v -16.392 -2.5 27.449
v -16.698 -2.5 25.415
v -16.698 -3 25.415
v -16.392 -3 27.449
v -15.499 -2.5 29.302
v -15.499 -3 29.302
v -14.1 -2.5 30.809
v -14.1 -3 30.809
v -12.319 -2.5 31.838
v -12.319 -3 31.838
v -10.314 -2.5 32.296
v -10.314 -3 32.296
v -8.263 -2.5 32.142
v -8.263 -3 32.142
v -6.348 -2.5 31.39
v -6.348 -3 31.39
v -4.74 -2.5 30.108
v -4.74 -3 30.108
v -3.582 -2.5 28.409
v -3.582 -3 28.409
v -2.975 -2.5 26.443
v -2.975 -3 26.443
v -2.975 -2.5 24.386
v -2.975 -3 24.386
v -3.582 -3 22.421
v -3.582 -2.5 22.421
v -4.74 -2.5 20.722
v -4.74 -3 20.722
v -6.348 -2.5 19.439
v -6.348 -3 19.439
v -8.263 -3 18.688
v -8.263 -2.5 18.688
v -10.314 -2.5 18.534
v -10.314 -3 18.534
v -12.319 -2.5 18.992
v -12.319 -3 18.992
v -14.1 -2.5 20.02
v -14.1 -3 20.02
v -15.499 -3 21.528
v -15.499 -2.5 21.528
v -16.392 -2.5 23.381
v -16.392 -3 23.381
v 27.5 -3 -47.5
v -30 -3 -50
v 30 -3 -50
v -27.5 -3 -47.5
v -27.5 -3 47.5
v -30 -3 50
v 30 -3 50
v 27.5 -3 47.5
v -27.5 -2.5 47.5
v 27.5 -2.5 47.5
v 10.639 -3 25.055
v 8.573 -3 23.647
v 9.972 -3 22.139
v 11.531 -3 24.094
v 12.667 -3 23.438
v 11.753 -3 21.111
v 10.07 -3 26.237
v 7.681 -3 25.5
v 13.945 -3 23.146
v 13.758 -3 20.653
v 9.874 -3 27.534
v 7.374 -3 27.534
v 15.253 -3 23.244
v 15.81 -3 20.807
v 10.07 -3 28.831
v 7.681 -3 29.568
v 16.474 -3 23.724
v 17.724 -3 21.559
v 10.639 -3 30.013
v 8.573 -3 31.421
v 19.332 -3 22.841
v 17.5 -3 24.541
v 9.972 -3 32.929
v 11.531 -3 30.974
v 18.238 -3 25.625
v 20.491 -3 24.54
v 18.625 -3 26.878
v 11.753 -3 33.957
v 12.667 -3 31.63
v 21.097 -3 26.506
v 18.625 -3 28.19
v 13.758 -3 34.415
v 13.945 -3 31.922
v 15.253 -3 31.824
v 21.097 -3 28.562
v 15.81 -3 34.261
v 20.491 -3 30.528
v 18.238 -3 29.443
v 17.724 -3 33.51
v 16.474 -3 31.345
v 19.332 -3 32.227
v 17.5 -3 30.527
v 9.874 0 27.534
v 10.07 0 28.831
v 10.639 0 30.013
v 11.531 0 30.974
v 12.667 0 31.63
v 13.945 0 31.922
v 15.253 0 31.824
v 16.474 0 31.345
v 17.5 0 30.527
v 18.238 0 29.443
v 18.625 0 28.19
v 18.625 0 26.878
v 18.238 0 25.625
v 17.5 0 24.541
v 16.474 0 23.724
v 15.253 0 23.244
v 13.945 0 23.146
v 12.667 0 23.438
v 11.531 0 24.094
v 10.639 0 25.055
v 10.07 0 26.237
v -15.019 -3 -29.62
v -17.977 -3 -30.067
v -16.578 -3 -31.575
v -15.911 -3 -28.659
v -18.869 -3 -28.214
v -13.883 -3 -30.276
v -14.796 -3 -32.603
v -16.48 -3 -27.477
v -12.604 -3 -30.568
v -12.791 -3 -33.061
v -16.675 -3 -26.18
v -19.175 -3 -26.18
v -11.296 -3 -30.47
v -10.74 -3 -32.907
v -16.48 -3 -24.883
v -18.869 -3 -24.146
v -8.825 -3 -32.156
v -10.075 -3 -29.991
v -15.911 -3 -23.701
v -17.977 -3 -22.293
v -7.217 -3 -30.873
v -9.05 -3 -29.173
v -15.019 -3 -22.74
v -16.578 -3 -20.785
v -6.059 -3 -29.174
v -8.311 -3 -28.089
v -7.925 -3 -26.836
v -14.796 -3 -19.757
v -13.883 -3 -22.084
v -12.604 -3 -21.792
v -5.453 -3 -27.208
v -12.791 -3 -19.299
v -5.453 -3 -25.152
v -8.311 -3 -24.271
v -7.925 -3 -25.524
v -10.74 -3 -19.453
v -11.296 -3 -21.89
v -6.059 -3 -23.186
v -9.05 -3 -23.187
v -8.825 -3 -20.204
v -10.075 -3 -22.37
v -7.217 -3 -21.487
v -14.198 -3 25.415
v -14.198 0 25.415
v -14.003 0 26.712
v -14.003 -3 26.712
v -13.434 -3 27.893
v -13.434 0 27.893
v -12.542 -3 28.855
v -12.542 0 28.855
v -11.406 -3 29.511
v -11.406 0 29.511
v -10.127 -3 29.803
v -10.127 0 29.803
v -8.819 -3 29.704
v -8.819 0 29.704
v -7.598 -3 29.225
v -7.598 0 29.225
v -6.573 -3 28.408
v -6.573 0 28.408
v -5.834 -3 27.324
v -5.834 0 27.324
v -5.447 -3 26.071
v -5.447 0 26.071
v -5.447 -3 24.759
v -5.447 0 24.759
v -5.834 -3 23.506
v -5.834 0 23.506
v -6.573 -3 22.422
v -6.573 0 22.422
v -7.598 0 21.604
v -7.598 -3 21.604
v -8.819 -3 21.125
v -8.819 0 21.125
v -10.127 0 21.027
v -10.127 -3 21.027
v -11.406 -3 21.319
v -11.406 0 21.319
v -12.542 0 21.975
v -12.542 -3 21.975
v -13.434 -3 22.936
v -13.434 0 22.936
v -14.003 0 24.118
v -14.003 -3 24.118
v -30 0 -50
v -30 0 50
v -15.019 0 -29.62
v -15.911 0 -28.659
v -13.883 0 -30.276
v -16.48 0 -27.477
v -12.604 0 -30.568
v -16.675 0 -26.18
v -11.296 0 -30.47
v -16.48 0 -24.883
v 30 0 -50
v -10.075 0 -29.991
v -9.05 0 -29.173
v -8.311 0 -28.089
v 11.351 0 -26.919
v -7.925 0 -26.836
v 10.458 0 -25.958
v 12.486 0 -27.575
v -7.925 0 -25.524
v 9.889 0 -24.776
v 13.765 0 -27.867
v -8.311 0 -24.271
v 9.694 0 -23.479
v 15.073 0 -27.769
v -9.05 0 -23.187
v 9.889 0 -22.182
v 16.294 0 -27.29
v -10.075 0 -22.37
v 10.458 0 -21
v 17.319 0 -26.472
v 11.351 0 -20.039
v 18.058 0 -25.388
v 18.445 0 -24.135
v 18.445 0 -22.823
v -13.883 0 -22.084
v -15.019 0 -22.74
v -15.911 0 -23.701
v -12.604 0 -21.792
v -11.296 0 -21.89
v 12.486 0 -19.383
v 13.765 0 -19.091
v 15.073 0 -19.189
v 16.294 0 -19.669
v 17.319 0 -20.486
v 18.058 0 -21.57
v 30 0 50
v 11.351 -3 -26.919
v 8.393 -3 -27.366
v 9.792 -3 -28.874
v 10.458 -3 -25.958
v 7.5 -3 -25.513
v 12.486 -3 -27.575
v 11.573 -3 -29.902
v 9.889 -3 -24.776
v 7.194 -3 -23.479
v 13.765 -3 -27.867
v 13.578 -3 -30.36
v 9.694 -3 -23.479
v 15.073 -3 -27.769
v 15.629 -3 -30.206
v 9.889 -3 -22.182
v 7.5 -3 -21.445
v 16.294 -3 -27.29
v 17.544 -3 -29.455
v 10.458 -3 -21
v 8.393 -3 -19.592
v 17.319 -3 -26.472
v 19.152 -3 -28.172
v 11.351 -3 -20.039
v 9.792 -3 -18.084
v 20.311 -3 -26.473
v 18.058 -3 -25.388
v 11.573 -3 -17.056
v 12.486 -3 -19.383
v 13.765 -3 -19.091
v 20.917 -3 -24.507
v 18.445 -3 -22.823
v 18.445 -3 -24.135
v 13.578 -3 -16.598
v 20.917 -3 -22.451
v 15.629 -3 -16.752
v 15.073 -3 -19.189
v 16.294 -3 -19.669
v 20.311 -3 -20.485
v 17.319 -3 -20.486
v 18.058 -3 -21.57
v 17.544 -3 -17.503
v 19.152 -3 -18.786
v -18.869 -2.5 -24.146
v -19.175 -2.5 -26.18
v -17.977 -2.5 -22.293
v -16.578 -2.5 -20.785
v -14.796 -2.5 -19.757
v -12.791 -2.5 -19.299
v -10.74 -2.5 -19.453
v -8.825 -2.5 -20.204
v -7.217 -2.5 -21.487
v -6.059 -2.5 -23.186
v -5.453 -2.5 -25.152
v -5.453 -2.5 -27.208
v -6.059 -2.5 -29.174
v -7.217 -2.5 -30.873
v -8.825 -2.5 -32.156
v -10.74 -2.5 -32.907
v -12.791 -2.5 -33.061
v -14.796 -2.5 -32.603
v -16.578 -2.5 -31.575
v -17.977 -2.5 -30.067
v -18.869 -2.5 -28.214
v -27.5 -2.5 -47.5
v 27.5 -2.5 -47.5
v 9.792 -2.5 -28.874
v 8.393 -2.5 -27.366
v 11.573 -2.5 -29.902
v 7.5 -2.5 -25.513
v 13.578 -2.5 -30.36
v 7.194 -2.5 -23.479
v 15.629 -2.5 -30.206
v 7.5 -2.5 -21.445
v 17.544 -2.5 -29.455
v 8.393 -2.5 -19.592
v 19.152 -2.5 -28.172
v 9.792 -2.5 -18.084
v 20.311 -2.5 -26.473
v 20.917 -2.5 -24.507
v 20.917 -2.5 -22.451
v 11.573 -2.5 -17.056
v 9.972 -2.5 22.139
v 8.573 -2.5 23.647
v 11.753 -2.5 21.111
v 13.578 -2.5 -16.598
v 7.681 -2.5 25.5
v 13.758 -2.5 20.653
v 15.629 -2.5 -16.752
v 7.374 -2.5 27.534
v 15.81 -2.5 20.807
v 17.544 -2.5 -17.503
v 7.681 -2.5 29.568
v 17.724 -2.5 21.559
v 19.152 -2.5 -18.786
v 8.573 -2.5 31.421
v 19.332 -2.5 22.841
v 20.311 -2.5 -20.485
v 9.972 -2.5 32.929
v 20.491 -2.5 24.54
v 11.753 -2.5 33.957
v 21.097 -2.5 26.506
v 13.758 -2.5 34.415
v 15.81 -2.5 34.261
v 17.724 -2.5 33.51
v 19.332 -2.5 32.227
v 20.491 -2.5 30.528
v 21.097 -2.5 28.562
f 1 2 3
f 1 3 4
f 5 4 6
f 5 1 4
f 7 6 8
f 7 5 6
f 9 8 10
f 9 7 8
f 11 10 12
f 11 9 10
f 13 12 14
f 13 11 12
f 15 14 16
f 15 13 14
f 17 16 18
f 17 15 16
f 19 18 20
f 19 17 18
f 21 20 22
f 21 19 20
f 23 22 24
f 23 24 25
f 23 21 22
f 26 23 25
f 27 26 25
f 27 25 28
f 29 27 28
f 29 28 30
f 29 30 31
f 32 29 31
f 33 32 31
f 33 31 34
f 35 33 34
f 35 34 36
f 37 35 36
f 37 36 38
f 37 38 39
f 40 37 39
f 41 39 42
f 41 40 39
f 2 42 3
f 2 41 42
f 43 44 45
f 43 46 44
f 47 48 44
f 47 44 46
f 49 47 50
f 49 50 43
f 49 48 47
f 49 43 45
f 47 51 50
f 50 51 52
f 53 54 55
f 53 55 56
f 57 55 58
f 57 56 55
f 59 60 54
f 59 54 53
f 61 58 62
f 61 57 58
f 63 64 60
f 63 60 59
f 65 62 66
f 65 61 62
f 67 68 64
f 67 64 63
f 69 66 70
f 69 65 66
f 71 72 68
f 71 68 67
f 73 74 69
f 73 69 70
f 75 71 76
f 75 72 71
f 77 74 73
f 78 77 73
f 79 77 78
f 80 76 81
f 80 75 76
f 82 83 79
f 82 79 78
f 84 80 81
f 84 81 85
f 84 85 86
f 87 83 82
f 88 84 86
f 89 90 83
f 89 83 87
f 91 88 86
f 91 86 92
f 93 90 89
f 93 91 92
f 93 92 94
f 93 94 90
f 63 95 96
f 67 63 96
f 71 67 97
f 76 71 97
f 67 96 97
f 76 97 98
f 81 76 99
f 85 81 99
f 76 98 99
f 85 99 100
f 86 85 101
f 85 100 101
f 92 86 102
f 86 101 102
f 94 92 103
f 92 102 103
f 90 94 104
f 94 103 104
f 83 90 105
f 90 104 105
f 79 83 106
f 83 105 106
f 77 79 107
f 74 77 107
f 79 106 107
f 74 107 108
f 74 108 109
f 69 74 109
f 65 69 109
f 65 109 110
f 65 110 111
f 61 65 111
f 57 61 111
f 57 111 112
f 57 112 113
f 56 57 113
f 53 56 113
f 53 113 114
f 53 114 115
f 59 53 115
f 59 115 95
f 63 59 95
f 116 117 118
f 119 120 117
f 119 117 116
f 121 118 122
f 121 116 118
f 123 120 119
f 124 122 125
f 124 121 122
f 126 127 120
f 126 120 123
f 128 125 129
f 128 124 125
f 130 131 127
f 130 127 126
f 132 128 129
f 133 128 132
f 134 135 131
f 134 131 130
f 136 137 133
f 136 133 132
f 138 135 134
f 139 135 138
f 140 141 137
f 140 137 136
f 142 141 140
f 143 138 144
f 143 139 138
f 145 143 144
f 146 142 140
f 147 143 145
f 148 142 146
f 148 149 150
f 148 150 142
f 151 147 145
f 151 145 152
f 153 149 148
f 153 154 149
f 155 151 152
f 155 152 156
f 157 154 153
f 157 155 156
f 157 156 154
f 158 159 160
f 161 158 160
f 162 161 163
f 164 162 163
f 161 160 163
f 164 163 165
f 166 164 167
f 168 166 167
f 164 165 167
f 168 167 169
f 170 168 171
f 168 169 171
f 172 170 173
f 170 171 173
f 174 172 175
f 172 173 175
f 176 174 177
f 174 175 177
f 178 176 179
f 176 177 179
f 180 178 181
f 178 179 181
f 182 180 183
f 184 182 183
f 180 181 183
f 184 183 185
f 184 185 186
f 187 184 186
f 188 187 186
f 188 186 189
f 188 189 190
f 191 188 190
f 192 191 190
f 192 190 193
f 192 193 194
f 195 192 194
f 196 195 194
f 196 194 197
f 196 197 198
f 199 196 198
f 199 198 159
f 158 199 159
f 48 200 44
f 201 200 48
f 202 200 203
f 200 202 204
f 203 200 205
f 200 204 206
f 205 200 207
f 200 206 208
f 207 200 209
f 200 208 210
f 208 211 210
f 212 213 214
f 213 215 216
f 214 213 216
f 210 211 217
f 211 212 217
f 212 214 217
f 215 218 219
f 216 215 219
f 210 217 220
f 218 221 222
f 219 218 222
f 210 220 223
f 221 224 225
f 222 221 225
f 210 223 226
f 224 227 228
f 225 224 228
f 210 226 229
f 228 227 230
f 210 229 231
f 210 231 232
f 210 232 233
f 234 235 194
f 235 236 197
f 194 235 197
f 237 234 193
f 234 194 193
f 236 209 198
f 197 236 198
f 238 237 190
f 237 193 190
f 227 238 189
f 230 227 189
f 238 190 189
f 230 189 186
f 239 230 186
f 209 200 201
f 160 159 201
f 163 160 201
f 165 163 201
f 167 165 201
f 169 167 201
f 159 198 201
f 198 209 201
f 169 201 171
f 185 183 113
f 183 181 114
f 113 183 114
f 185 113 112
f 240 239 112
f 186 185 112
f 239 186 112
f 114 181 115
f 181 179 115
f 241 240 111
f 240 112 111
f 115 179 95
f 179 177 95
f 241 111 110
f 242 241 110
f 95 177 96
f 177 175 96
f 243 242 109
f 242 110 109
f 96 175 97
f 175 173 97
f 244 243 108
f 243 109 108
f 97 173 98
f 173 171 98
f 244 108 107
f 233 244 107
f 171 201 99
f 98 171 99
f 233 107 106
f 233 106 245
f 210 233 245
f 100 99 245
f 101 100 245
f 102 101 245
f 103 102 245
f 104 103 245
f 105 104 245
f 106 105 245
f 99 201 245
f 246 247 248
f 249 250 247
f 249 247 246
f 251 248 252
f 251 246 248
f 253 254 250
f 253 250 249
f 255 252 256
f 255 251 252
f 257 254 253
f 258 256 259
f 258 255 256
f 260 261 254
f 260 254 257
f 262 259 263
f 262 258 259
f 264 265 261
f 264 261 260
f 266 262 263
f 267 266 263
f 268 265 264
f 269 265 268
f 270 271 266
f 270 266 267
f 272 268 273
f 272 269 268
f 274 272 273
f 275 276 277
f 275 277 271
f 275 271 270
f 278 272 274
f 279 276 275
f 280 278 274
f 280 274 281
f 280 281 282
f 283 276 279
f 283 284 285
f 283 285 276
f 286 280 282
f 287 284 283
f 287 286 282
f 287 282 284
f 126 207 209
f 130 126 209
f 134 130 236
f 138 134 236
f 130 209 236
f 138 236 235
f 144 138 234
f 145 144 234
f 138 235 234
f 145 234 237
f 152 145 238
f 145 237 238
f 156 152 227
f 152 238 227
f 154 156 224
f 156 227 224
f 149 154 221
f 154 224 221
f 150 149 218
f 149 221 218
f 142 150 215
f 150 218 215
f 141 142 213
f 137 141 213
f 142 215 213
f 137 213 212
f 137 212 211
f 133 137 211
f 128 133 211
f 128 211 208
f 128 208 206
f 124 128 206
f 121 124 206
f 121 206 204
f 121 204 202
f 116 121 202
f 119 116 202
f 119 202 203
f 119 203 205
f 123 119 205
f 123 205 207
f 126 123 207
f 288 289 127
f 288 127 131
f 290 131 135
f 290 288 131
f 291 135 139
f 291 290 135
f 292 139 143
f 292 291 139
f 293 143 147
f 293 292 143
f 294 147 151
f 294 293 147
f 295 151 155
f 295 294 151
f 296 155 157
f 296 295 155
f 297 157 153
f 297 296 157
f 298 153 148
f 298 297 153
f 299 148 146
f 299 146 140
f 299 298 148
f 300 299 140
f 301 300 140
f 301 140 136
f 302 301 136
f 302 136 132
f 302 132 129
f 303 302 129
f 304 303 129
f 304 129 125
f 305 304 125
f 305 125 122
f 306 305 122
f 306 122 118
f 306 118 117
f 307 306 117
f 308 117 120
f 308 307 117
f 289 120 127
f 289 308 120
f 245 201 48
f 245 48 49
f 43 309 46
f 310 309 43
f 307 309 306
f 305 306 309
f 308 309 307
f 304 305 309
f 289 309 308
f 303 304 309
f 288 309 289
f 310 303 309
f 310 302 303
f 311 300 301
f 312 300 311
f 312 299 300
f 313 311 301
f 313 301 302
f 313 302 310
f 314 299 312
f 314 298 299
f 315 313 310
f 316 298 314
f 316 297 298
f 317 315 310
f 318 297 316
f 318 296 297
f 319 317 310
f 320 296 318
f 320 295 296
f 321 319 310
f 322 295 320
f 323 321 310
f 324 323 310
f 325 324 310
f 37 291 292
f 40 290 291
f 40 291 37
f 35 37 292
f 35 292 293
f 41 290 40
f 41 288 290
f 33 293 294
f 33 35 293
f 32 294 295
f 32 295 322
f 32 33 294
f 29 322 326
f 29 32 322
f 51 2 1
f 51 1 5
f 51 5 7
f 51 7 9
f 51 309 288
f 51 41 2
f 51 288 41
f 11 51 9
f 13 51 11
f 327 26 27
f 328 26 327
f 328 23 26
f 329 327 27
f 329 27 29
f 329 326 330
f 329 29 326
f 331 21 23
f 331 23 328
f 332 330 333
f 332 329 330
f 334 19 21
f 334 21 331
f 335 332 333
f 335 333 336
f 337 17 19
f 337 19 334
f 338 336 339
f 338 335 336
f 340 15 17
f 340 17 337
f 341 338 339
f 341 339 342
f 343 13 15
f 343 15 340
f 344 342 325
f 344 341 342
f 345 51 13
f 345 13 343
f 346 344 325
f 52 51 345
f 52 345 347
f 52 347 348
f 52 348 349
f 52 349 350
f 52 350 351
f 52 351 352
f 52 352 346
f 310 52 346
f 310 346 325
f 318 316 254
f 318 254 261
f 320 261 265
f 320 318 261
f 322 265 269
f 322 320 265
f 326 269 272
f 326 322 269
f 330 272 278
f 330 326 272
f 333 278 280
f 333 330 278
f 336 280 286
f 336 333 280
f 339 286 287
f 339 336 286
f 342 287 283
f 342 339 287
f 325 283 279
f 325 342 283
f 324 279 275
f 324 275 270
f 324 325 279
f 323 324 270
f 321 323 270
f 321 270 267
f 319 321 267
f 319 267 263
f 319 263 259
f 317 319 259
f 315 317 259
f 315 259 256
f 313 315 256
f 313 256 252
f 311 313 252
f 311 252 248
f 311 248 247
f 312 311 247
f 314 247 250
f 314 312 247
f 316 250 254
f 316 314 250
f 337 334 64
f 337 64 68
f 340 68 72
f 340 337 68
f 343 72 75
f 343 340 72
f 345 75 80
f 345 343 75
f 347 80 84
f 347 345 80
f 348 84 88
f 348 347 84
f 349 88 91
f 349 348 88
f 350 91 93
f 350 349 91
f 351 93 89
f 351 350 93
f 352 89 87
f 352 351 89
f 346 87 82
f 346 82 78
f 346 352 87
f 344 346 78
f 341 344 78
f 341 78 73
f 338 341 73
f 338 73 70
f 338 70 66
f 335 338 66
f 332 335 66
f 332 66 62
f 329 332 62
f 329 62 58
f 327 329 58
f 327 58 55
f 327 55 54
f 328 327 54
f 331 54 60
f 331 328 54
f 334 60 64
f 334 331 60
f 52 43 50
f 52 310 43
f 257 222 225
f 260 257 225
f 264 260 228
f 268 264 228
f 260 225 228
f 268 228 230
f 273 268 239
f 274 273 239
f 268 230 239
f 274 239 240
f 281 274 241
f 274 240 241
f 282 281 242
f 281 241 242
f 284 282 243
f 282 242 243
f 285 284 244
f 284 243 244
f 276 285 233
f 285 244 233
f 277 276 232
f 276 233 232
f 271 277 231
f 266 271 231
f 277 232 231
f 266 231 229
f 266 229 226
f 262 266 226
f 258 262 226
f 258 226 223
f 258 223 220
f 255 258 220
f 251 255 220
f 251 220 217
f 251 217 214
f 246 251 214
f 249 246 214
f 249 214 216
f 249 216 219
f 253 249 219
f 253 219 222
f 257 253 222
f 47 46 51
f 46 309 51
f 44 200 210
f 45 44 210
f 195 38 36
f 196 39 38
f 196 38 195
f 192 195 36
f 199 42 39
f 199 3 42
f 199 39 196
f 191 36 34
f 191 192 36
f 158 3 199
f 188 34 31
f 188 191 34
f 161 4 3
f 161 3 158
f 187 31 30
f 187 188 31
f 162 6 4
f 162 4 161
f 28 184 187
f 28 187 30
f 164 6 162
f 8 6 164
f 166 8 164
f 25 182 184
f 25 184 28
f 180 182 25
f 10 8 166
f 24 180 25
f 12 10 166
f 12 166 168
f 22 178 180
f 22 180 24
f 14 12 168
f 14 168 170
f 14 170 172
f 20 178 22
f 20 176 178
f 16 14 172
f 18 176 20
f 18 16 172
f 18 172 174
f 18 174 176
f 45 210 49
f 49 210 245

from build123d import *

# Parameters (mm, degrees)
F0_W     = 60
F0_H     = 100
F1_DEPTH = 3
F3_D     = 8.8
F4_T     = -2.5


with BuildPart() as f1:
    # F0 (on Front) → F1 (new body)
    with BuildSketch(Plane.XZ):
        Rectangle(F0_W, F0_H)
    extrude(amount=F1_DEPTH)

    # F3 (through all)
    with Locations(Plane.XZ.offset(3)):
        with Locations((-9.7982781008, 25.4148039967), (14.2741240561, 27.5341067463), (14.0938721597, -23.4790239483), (-12.2754974291, -26.1800661683)):
            Hole(F3_D / 2)

    # F4
    f4_openings = [f1.faces().sort_by_distance(p)[0] for p in [
        (-0.0665, -3, -0.034758),
    ]]
    offset(amount=F4_T, openings=f4_openings)


solid = f1.part
